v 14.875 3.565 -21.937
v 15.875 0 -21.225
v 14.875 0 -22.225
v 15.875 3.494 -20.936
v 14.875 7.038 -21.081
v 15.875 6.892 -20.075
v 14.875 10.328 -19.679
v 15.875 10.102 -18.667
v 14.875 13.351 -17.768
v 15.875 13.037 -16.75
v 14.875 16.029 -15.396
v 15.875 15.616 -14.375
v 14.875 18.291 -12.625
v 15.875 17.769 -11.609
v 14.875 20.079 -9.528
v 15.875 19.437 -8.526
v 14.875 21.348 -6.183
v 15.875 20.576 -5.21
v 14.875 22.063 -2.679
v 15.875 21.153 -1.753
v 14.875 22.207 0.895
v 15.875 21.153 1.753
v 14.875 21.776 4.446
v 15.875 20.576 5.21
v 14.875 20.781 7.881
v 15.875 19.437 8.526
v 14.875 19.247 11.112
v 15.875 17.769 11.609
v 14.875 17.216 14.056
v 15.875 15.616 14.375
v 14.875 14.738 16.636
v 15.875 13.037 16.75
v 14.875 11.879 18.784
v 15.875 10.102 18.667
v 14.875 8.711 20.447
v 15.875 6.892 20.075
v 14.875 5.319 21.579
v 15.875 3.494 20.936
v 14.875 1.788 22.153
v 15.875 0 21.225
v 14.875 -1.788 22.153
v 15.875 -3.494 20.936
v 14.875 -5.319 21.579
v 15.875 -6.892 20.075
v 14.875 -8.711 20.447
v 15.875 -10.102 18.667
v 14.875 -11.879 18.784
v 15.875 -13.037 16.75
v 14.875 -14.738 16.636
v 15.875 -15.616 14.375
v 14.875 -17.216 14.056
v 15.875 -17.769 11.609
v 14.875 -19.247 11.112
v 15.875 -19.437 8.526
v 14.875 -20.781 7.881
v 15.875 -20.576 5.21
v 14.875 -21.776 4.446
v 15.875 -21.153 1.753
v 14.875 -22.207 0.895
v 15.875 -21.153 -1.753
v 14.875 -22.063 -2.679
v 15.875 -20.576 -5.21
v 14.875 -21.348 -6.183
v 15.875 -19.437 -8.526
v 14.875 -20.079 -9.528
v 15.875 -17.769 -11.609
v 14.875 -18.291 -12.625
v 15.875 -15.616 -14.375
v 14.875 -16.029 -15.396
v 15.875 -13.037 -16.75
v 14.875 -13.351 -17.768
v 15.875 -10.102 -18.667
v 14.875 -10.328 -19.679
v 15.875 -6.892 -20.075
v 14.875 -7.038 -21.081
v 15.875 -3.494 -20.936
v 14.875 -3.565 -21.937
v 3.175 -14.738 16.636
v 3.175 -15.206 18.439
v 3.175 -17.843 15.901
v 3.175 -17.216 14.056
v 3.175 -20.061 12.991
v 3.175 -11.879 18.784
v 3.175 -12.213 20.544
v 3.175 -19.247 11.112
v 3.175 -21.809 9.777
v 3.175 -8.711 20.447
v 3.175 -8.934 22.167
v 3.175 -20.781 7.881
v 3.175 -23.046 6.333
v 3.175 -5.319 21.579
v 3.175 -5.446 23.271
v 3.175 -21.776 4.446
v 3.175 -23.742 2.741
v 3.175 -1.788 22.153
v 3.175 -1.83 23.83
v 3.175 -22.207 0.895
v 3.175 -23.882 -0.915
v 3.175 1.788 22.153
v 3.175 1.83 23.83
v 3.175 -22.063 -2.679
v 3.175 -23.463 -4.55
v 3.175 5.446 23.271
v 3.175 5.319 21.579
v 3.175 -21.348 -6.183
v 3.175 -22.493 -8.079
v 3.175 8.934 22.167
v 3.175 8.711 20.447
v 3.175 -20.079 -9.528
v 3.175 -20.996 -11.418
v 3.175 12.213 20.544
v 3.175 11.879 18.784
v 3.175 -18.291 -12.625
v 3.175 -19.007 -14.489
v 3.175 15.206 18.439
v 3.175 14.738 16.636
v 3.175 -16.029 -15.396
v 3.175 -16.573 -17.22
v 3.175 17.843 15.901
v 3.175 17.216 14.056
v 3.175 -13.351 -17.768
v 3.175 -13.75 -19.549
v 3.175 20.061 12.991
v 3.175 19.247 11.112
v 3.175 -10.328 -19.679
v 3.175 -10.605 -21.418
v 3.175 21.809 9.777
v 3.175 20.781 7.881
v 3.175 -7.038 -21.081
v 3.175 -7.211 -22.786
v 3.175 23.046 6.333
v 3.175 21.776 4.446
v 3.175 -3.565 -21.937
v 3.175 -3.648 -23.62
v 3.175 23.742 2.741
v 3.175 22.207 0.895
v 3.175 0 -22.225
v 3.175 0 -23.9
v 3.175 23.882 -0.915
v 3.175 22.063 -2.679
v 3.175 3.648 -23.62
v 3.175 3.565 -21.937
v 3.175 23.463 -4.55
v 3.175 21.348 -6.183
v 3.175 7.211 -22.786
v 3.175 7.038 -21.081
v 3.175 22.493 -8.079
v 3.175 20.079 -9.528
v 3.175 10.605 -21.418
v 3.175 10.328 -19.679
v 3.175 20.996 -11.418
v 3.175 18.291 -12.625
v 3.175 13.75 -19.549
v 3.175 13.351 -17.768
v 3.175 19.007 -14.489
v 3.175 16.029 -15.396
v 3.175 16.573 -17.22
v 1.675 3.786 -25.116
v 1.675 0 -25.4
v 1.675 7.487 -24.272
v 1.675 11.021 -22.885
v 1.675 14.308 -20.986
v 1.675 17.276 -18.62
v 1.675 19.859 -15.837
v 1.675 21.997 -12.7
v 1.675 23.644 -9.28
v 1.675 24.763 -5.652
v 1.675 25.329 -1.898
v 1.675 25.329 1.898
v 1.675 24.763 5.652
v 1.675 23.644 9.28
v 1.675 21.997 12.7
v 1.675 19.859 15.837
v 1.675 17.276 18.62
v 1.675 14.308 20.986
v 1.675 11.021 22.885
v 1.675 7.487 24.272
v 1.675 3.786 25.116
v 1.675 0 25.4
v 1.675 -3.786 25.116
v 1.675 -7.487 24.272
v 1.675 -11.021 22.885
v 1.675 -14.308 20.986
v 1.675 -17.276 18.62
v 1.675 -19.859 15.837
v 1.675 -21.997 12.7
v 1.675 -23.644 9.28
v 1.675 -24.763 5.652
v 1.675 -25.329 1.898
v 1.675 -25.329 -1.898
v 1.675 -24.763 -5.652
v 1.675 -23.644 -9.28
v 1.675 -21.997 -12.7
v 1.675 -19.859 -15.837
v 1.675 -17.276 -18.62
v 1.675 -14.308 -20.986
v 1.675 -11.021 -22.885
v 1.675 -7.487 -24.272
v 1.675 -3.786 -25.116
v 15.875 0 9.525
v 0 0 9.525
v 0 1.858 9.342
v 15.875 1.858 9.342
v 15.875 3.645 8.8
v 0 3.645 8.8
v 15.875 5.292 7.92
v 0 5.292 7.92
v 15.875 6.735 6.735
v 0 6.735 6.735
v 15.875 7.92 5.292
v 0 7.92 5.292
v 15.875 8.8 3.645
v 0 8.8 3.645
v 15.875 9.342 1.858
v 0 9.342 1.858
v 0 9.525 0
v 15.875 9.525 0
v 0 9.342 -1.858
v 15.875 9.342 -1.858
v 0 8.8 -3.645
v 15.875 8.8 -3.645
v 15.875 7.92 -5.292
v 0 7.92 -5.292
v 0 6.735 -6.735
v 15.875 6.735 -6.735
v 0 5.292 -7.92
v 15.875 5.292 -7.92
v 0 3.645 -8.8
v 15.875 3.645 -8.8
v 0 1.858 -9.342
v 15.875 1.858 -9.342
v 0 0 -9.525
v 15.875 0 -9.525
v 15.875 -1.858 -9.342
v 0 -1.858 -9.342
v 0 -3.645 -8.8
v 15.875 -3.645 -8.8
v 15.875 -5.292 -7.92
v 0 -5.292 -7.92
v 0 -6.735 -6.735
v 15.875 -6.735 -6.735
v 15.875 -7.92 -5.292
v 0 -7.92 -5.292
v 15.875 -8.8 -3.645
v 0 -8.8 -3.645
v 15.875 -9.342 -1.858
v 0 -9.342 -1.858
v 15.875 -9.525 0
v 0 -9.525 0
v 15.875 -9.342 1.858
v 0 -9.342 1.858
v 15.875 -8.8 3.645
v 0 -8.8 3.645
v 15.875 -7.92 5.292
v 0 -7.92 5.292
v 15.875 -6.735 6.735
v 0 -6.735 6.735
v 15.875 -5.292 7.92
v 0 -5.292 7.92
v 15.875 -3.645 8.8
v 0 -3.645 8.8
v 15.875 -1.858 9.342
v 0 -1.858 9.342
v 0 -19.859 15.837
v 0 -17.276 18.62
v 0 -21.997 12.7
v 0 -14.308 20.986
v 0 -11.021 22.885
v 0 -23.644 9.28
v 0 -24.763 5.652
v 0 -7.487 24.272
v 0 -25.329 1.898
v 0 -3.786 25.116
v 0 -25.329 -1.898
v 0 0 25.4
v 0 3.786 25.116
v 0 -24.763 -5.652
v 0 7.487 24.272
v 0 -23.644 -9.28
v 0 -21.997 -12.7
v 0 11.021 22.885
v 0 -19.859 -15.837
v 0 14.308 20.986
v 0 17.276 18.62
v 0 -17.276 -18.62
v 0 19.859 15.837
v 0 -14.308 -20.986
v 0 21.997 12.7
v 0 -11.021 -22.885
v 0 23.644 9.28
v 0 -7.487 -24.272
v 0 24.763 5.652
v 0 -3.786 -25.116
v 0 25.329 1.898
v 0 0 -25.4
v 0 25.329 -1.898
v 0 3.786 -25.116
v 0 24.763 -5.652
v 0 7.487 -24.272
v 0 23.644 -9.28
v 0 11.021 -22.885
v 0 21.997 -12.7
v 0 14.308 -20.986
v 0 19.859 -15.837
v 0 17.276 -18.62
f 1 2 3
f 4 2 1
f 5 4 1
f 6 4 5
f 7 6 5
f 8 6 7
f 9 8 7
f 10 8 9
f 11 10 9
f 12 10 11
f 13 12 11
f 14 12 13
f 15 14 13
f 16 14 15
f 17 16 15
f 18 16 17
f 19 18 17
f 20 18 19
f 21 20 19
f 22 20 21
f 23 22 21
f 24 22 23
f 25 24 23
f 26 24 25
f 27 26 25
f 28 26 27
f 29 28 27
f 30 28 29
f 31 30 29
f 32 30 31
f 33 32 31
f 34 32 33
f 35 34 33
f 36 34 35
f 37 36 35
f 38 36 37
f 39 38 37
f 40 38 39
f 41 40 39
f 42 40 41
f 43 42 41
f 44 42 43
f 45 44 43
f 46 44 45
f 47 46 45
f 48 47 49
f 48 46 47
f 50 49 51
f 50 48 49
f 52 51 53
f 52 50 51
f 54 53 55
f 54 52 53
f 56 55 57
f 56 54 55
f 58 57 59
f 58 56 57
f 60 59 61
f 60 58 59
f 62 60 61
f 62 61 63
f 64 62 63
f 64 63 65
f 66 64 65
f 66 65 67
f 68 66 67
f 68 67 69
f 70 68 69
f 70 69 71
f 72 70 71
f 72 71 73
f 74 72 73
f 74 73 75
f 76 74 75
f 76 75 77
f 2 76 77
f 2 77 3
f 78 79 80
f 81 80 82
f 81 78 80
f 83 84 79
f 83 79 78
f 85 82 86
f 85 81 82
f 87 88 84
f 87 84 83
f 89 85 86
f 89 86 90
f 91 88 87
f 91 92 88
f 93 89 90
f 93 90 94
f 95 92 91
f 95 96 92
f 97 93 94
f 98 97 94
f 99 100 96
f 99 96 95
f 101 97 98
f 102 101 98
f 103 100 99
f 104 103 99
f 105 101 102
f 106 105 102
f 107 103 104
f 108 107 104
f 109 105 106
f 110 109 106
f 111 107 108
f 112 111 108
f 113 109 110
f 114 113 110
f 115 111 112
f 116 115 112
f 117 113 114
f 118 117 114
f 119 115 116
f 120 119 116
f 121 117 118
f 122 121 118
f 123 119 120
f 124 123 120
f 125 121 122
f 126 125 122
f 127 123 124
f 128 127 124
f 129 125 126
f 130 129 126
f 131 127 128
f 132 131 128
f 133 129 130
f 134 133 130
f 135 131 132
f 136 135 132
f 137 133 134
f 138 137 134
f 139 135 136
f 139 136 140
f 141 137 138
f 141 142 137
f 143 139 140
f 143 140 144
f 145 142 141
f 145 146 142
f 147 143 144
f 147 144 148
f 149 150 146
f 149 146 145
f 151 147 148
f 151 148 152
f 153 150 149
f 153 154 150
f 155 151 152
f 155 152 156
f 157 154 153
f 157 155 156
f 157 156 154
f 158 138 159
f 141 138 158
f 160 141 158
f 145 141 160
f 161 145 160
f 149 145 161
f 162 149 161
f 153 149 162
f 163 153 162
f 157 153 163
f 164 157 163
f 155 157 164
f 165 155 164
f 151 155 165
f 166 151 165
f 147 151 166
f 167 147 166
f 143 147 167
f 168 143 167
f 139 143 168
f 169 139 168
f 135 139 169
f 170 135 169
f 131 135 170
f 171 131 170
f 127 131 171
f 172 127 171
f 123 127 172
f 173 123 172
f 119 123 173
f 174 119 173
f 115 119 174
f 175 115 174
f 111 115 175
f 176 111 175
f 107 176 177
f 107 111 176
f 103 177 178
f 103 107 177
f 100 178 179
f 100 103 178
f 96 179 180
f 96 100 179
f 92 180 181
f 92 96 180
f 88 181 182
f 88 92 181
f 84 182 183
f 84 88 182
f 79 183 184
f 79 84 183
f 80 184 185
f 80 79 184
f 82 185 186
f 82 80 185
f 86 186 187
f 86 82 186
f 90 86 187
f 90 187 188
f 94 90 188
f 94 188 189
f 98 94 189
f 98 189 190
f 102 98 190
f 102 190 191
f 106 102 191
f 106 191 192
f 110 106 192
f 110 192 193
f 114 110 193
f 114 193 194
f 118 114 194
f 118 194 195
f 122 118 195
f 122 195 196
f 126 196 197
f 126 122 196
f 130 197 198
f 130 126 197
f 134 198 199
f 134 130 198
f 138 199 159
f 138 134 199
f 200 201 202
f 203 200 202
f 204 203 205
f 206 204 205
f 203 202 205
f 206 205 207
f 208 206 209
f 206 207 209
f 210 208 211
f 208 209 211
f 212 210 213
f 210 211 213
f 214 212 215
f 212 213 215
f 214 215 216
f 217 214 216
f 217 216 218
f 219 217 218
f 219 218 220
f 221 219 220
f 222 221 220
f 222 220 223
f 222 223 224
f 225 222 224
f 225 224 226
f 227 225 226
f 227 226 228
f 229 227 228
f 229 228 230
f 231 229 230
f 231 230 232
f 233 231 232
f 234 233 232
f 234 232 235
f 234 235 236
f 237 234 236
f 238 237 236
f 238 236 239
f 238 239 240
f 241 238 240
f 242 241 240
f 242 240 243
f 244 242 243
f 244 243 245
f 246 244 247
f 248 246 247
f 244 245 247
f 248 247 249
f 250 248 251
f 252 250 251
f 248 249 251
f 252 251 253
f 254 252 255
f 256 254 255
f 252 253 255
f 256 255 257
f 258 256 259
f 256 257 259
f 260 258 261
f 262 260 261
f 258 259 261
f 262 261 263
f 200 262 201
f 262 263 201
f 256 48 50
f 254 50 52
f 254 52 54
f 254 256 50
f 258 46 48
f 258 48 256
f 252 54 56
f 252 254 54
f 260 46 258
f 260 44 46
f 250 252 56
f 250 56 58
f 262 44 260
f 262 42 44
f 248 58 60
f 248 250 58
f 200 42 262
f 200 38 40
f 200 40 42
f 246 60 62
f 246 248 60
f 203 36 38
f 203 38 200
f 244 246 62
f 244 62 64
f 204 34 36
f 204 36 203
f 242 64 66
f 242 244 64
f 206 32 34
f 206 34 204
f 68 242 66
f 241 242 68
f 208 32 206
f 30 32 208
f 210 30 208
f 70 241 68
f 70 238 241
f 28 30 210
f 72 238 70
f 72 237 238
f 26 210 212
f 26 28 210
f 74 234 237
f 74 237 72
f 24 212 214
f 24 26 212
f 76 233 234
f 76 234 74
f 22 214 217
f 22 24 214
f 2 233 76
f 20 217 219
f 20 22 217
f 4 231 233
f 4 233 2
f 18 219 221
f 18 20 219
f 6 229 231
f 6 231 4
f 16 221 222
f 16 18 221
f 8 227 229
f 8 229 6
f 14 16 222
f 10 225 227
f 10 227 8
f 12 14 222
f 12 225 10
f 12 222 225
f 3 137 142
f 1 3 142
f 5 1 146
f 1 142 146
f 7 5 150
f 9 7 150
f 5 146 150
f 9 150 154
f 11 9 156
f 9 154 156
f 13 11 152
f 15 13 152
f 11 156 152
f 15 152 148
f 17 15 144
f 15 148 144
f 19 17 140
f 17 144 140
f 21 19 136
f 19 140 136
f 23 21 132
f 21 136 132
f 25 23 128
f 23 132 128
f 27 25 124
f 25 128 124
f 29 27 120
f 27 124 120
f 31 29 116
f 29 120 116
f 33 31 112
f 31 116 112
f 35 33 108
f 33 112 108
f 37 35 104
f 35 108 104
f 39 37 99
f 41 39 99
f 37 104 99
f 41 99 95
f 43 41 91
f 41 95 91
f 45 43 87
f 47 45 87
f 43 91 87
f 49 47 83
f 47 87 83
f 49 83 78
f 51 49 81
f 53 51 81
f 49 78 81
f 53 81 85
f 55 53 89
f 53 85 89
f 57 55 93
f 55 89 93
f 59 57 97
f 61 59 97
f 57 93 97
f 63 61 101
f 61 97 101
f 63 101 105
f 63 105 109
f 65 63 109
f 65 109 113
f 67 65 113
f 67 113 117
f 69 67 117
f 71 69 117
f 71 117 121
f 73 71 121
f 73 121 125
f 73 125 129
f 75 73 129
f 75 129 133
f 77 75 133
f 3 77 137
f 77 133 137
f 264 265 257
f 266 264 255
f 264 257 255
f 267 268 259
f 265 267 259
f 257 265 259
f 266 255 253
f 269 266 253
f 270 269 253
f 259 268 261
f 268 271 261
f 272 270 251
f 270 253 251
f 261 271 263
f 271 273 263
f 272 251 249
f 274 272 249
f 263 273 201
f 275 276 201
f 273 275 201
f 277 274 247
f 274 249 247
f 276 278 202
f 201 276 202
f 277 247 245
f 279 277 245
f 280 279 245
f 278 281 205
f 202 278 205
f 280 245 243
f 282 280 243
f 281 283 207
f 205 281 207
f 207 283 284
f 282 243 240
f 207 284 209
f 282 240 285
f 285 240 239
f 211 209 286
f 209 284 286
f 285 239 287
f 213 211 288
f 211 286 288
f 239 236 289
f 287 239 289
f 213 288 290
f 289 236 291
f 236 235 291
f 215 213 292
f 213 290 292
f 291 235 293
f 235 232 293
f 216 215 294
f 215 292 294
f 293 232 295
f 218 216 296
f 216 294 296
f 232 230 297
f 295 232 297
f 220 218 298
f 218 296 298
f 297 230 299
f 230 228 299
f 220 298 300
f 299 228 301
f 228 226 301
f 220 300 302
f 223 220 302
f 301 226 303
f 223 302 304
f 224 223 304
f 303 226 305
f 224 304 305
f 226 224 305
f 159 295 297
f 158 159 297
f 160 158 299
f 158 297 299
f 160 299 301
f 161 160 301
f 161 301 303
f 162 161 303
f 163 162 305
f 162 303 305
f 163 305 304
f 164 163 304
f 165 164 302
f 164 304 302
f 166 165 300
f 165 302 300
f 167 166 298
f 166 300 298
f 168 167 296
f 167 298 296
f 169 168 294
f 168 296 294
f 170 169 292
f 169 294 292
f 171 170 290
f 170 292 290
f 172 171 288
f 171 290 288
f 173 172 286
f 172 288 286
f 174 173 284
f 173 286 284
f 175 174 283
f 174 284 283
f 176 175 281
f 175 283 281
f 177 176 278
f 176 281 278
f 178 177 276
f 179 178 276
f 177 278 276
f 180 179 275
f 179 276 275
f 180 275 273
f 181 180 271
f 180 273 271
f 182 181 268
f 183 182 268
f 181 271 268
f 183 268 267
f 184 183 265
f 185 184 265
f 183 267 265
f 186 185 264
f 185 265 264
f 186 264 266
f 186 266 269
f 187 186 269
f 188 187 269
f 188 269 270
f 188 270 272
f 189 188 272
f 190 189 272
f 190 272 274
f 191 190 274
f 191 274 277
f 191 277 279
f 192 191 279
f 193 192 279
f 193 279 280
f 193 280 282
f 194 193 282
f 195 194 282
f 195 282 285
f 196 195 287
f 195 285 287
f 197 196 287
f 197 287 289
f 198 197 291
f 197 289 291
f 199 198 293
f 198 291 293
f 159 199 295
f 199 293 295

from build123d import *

# Parameters (mm, degrees)
SKETCH1_R           = 25.4
BOSS_EXTRUDE1_DEPTH = 3.175
SKETCH2_R           = 22.225
BOSS_EXTRUDE2_DEPTH = 12.7
SKETCH3_R           = 9.525
CUT_EXTRUDE1_DEPTH  = 16.875
CHAMFER1_SIZE       = 1.5
CHAMFER2_SIZE       = 1


with BuildPart() as part:
    # Sketch1 → Boss-Extrude1 (new body)
    with BuildSketch(Plane(origin=(0, 0, 0), x_dir=(0, 0, -1), z_dir=(1, 0, 0))):
        Circle(SKETCH1_R)
    extrude(amount=BOSS_EXTRUDE1_DEPTH)

    # Sketch2 → Boss-Extrude2 (add)
    with BuildSketch(Plane(origin=(3.175, 0, 0), x_dir=(0, 0, -1), z_dir=(1, 0, 0))):
        Circle(SKETCH2_R)
    extrude(amount=BOSS_EXTRUDE2_DEPTH)

    # Sketch3 → Cut-Extrude1 (cut, through all)
    with BuildSketch(Plane.ZY):
        Circle(SKETCH3_R)
    extrude(amount=-CUT_EXTRUDE1_DEPTH, mode=Mode.SUBTRACT)

    # Chamfer1
    chamfer1_edges = [part.edges().sort_by_distance(p)[0] for p in [
        (3.175, 0, 25.4),
    ]]
    chamfer(chamfer1_edges, length=CHAMFER1_SIZE)

    # Chamfer2
    chamfer2_edges = [part.edges().sort_by_distance(p)[0] for p in [
        (15.875, 0, 22.225),
    ]]
    chamfer(chamfer2_edges, length=CHAMFER2_SIZE)


solid = part.part
